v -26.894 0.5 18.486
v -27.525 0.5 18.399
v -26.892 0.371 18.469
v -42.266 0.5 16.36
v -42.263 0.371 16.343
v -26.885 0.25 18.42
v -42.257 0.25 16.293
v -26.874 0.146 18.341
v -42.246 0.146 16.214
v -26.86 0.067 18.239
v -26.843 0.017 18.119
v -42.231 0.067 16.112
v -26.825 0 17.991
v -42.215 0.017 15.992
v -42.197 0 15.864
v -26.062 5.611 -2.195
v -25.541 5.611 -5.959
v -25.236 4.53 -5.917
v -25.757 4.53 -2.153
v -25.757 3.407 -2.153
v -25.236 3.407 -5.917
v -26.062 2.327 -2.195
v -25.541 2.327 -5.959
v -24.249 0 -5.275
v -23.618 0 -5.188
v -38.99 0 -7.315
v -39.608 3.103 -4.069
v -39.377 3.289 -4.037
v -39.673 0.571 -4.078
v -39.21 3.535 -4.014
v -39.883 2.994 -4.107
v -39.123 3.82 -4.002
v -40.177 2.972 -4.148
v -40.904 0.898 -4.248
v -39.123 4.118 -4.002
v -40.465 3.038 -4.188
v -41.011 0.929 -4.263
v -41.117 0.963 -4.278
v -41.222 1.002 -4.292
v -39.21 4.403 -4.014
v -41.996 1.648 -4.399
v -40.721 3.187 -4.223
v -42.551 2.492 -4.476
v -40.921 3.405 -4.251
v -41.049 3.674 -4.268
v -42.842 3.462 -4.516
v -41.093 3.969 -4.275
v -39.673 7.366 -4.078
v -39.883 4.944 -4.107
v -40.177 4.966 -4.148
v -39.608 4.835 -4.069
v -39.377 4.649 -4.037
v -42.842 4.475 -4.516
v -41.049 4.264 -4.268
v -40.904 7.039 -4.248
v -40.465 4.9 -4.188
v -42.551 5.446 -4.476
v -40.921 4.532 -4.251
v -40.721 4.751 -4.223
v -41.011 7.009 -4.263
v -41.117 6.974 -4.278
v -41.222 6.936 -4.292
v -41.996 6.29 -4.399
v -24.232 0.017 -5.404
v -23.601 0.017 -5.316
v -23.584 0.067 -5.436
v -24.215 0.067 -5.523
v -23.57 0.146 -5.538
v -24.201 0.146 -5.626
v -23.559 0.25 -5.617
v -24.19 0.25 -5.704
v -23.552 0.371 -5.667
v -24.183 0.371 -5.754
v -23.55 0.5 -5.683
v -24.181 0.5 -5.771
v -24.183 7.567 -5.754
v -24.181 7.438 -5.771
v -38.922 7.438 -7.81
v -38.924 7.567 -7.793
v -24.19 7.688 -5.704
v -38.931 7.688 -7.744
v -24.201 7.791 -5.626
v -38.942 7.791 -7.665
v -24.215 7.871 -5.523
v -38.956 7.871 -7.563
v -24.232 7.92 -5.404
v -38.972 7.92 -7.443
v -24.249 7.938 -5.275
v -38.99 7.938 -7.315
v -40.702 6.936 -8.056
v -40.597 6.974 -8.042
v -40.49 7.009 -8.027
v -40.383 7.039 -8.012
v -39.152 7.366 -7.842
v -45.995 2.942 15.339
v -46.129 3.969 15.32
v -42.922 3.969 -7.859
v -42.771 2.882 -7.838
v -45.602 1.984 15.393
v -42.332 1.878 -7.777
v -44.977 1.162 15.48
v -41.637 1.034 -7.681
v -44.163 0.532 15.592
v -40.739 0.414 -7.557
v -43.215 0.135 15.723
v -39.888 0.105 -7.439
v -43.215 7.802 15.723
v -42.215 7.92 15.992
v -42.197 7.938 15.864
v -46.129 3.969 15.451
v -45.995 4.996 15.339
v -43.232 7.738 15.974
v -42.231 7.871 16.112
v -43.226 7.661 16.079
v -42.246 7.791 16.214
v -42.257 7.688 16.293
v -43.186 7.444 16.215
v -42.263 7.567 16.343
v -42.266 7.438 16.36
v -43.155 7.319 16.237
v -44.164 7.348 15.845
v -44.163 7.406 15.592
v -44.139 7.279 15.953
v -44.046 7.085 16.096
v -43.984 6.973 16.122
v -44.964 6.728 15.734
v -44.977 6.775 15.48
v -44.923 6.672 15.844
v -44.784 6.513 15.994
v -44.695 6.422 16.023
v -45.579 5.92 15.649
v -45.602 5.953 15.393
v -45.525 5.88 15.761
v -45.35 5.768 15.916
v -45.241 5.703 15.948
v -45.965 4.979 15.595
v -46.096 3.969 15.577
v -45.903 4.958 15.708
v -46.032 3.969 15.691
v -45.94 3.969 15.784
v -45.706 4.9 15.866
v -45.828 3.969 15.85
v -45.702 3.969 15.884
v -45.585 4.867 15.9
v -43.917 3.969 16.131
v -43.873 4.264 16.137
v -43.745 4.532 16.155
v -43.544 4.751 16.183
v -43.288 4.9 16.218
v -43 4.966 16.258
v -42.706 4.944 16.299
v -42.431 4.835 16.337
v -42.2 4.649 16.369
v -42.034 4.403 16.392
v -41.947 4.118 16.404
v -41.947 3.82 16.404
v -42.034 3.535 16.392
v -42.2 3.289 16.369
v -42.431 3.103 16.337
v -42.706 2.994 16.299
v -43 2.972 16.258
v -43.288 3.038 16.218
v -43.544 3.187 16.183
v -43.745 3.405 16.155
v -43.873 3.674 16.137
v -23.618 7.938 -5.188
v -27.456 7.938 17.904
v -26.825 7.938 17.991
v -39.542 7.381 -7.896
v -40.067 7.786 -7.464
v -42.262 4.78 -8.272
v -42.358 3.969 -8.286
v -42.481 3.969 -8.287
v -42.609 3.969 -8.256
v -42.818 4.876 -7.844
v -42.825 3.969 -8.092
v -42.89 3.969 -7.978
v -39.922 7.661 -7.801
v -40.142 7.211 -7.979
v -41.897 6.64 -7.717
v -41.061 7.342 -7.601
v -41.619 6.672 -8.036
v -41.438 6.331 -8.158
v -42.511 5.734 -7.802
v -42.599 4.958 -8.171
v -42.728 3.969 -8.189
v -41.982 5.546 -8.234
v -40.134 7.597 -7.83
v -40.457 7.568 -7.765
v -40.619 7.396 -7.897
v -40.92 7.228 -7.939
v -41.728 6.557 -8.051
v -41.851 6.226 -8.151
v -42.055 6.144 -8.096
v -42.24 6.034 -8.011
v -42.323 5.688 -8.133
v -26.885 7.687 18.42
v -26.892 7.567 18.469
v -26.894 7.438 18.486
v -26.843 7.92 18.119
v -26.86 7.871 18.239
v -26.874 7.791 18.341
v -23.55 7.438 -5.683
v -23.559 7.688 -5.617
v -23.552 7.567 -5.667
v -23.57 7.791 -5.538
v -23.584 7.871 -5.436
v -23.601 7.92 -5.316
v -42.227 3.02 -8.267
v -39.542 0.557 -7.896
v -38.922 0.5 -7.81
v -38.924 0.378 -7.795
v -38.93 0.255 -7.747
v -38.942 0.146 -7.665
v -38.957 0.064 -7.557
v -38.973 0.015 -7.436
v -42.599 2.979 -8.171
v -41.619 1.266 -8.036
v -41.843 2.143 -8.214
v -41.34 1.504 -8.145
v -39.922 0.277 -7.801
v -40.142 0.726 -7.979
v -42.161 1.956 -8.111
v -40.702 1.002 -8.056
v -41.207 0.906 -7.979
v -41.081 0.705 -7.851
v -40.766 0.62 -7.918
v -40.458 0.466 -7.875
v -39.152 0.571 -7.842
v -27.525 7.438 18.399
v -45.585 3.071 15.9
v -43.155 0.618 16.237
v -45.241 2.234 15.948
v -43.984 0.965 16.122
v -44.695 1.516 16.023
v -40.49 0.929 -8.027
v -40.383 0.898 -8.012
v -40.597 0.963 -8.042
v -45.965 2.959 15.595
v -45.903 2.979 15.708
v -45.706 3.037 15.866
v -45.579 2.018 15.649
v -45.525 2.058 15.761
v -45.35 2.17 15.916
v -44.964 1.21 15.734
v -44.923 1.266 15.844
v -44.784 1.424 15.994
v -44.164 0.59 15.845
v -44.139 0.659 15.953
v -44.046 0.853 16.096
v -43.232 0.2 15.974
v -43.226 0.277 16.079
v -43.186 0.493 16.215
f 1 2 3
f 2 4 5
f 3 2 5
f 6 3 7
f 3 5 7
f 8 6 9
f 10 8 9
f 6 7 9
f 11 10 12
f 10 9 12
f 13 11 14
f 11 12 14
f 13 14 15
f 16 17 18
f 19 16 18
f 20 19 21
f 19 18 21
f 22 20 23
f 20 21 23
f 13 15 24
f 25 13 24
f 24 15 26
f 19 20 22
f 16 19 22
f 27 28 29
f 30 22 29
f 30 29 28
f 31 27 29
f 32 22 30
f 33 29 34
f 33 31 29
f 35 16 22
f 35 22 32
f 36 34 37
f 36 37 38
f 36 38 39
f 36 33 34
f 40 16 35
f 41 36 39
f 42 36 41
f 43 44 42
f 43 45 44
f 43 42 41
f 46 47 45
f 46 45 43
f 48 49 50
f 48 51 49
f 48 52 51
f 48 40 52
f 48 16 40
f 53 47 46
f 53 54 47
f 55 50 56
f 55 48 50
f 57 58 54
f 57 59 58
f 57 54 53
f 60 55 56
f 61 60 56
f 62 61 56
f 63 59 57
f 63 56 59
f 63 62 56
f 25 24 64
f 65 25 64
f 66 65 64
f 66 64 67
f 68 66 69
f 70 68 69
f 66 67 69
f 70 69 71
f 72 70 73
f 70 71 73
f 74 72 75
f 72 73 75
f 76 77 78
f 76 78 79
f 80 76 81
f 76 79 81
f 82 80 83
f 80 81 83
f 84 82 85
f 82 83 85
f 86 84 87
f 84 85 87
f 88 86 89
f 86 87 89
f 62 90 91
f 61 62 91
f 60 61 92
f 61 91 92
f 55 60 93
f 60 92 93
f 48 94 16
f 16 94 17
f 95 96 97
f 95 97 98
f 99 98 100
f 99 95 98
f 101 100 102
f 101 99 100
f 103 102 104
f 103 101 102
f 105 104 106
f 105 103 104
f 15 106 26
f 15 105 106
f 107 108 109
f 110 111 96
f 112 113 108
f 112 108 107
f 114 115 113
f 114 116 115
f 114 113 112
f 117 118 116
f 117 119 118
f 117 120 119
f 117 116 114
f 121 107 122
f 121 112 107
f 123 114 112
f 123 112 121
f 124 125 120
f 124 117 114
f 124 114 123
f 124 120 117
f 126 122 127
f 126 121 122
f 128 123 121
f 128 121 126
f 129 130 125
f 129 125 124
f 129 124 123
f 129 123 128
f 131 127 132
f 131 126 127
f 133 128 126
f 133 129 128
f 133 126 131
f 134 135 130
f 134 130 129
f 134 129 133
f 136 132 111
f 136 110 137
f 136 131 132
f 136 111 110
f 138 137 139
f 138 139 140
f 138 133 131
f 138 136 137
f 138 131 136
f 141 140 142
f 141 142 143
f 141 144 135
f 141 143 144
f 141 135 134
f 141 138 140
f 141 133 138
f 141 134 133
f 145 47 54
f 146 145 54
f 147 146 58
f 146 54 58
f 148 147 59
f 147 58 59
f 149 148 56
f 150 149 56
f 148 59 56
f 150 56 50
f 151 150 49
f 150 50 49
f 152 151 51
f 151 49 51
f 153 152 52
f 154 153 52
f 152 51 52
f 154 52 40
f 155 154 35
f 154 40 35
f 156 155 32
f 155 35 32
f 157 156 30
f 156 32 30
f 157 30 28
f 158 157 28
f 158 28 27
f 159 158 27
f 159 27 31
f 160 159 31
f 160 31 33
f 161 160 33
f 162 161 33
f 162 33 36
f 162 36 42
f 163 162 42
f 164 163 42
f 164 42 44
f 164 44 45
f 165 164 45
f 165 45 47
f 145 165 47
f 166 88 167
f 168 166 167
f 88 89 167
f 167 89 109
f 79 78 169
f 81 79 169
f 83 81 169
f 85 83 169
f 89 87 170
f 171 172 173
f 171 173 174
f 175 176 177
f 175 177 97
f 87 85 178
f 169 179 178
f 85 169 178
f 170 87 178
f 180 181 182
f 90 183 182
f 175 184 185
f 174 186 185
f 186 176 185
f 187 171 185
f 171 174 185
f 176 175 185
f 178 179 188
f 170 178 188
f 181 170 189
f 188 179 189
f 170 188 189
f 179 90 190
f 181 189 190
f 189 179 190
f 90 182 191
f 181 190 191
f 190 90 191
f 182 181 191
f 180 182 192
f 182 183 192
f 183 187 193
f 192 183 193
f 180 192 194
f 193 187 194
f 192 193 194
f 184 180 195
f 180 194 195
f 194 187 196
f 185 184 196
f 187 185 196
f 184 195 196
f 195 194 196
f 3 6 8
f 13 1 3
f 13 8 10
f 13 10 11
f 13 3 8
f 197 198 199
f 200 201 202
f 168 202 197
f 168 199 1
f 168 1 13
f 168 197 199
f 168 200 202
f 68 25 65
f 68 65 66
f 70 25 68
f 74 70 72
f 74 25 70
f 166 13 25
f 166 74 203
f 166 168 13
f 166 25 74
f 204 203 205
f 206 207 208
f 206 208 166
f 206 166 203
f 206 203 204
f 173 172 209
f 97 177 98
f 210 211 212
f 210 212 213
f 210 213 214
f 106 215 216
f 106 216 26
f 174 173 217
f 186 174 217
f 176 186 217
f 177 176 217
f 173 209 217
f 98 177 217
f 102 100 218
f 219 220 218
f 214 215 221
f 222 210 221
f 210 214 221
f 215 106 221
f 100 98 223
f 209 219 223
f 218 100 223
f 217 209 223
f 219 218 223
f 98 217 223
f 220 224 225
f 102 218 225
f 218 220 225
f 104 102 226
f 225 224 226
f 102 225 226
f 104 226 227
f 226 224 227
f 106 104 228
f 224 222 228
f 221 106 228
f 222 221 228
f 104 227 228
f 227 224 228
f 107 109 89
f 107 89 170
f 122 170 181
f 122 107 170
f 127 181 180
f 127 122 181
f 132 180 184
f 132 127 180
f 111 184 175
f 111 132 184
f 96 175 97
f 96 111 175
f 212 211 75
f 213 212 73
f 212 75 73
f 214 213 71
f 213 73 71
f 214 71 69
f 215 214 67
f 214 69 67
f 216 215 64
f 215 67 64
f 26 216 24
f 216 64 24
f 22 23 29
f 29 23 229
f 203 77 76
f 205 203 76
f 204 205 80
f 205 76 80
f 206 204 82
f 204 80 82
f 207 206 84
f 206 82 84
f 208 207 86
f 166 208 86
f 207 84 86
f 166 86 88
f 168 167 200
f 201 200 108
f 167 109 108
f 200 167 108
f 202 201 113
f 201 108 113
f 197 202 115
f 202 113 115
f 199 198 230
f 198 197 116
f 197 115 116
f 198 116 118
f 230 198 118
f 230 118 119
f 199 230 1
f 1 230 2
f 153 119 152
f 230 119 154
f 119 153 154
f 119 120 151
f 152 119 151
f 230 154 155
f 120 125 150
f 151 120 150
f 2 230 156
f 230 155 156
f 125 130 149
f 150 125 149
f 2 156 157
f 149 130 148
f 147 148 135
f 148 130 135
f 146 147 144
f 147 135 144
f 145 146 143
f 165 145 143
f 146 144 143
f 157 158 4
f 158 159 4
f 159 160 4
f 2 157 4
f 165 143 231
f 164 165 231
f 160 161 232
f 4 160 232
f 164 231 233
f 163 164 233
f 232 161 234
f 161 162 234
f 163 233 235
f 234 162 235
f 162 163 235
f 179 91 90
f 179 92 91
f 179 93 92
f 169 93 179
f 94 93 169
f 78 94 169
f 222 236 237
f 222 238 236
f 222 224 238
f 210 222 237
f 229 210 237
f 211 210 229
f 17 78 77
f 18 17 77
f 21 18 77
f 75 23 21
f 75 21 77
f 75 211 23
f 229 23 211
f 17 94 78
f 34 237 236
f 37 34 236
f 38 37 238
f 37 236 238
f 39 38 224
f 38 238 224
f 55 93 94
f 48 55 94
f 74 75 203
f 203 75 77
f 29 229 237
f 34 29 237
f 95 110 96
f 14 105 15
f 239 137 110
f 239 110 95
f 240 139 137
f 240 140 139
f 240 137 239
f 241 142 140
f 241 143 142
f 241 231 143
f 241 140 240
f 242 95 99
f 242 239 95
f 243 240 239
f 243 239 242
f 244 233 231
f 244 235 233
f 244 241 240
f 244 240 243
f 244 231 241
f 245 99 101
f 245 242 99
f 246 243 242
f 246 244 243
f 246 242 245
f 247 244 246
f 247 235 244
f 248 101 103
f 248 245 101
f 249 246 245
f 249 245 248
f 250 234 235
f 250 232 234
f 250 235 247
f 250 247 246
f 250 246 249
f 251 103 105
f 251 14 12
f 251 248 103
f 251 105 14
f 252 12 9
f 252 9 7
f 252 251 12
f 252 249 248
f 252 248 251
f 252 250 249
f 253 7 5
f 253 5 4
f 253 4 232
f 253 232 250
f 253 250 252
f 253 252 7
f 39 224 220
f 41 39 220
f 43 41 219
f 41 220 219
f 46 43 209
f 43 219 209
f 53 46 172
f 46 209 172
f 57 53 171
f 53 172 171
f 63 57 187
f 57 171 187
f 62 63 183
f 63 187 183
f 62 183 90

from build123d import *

# Parameters (mm, degrees)
BOSS_EXTRUDE1_DEPTH     = 7.9375
SKETCH3_R               = 2.032
CUT_EXTRUDE1_DEPTH      = 2.7
SKETCH4_R               = 1.000000032
CUT_EXTRUDE2_DEPTH      = 51.553064313
CUT_EXTRUDE3_DEPTH      = 52.939206859
CUT_EXTRUDE3_DEPTH_BACK = 52.939206859
CUT_EXTRUDE5_DEPTH      = 0.7
FILLET1_R               = 0.5
SKETCH6_R               = 2.032
CUT_EXTRUDE4_DEPTH      = 3.8
BOSS_EXTRUDE2_DEPTH     = 0.637


with BuildPart() as part:
    # Sketch1 → Boss-Extrude1 (new body)
    with BuildSketch(Plane(origin=(0, 0, 0), x_dir=(1, 0, 0), z_dir=(0, 1, 0))):
        Polygon((-27.620855991, -19.092445695), (-46.29298428, -16.509012872), (-42.852975587, 8.354139385), (-24.180847298, 5.770706562), align=None)
    extrude(amount=BOSS_EXTRUDE1_DEPTH)

    # Sketch3 → Cut-Extrude1 (cut)
    with BuildSketch(Plane(origin=(0.275554746, 0, -2.386974896), x_dir=(-0.9905638349724136, 0, -0.13705213914691383), z_dir=(0.13705213914691383, 0, -0.9905638349724136))):
        with Locations((40.237375061, 3.96875)):
            Circle(SKETCH3_R)
    extrude(amount=-CUT_EXTRUDE1_DEPTH, mode=Mode.SUBTRACT)

    # Sketch4 → Cut-Extrude2 (cut, through all)
    with BuildSketch(Plane(origin=(-0.040811883, 0, 0.29497369), x_dir=(-0.9905638349724136, 0, -0.13705213914691383), z_dir=(0.1370521391469138, 0, -0.9905638349724135))):
        with Locations((40.291560511, 3.96875)):
            Circle(SKETCH4_R)
    extrude(amount=-CUT_EXTRUDE2_DEPTH, mode=Mode.SUBTRACT)

    # Sketch5 → Cut-Extrude3 (cut, two sides: drawn at the far end of the back side and taken through both)
    with BuildSketch(Plane(origin=(0.329228893, 0, -2.379548664), x_dir=(-0.9905638349724137, 0, -0.1370521391469133), z_dir=(0.1370521391469133, 0, -0.9905638349724137)).offset(-CUT_EXTRUDE3_DEPTH_BACK)):
        with BuildLine():
            ThreePointArc((43.593560511, 3.96875), (42.431140549, 1.162419962), (39.624810511, 0))
            Line((39.624810511, 0), (43.593560511, 0))
            Line((43.593560511, 0), (43.593560511, 3.96875))
        make_face()
        with BuildLine():
            Line((43.593560511, 7.9375), (39.624810511, 7.9375))
            ThreePointArc((39.624810511, 7.9375), (42.431140549, 6.775080038), (43.593560511, 3.96875))
            Line((43.593560511, 3.96875), (43.593560511, 7.9375))
        make_face()
    extrude(amount=CUT_EXTRUDE3_DEPTH + CUT_EXTRUDE3_DEPTH_BACK, mode=Mode.SUBTRACT)

    # Sketch8 → Cut-Extrude5 (cut)
    with BuildSketch(Plane(origin=(-3.1107798, 0, 22.483603594), x_dir=(0.9905638349724136, 0, 0.1370521391469135), z_dir=(-0.1370521391469135, 0, 0.9905638349724137))):
        with BuildLine():
            Line((-39.624810511, 0), (-24.743560511, 0))
            Line((-24.743560511, 0), (-24.743560511, 7.9375))
            Line((-24.743560511, 7.9375), (-39.624810511, 7.9375))
            ThreePointArc((-39.624810511, 7.9375), (-43.593560511, 3.96875), (-39.624810511, 0))
        make_face()
    extrude(amount=-CUT_EXTRUDE5_DEPTH, mode=Mode.SUBTRACT)

    # Fillet1
    fillet1_edges = [part.edges().sort_by_distance(p)[0] for p in [
        (-42.852975587, 3.96875, -8.354139385),
        (-31.551261333, 0, -6.790460135),
        (-46.197047782, 3.96875, 15.815618188),
        (-34.895333528, 7.9375, 17.379297438),
        (-34.895333528, 0, 17.379297438),
        (-31.551261333, 7.9375, -6.790460135),
    ]]
    fillet(fillet1_edges, radius=FILLET1_R)

    # Sketch6 → Cut-Extrude4 (cut)
    # profile 1 of 4: a face of its own
    with BuildSketch(Plane(origin=(0.329228893, 0, -2.379548664), x_dir=(-0.9905638349724137, 0, -0.1370521391469133), z_dir=(0.1370521391469133, 0, -0.9905638349724137))):
        with BuildLine():
            Line((41.099755957, 7.039164487), (39.857545305, 7.366139557))
            Line((39.857545305, 7.366139557), (26.117003817, 5.610790678))
            ThreePointArc((26.117003817, 5.610790678), (25.770140702, 3.96875), (26.117003817, 2.326709322))
            Line((26.117003817, 2.326709322), (39.857545305, 0.571360443))
            Line((39.857545305, 0.571360443), (41.099755957, 0.898335513))
            ThreePointArc((41.099755957, 0.898335513), (40.498298253, 0.800487936), (39.889225247, 0.819345082))
            Line((39.889225247, 0.819345082), (26.291560511, 2.556441511))
            Line((26.291560511, 2.556441511), (26.291560511, 3.67018175))
            ThreePointArc((26.291560511, 3.67018175), (27.210560511, 3.96875), (26.291560511, 4.26731825))
            Line((26.291560511, 4.26731825), (26.291560511, 5.381058489))
            Line((26.291560511, 5.381058489), (39.889225247, 7.118154918))
            ThreePointArc((39.889225247, 7.118154918), (40.498298253, 7.137012064), (41.099755957, 7.039164487))
        make_face()
    # profile 2 of 4: a face of its own
    with BuildSketch(Plane(origin=(0.329228893, 0, -2.379548664), x_dir=(-0.9905638349724137, 0, -0.1370521391469133), z_dir=(0.1370521391469133, 0, -0.9905638349724137))):
        with BuildLine():
            ThreePointArc((39.889225247, 0.819345082), (37.116560511, 3.96875), (39.889225247, 7.118154918))
            Line((39.889225247, 7.118154918), (26.291560511, 5.381058489))
            Line((26.291560511, 5.381058489), (26.291560511, 4.26731825))
            ThreePointArc((26.291560511, 4.26731825), (27.210560511, 3.96875), (26.291560511, 3.67018175))
            Line((26.291560511, 3.67018175), (26.291560511, 2.556441511))
            Line((26.291560511, 2.556441511), (39.889225247, 0.819345082))
        make_face()
    # profile 3 of 4: a face of its own
    with BuildSketch(Plane(origin=(0.329228893, 0, -2.379548664), x_dir=(-0.9905638349724137, 0, -0.1370521391469133), z_dir=(0.1370521391469133, 0, -0.9905638349724137))):
        with BuildLine():
            ThreePointArc((41.421703743, 6.935802624), (41.262106814, 6.991772473), (41.099755957, 7.039164487))
            ThreePointArc((41.099755957, 7.039164487), (40.498298253, 7.137012064), (39.889225247, 7.118154918))
            ThreePointArc((39.889225247, 7.118154918), (37.116560511, 3.96875), (39.889225247, 0.819345082))
            ThreePointArc((39.889225247, 0.819345082), (40.498298253, 0.800487936), (41.099755957, 0.898335513))
            ThreePointArc((41.099755957, 0.898335513), (41.262106814, 0.945727527), (41.421703743, 1.001697376))
            ThreePointArc((41.421703743, 1.001697376), (43.093560511, 3.96875), (41.421703743, 6.935802624))
        make_face()
        with Locations((40.291560511, 3.96875)):
            Circle(SKETCH6_R, mode=Mode.SUBTRACT)
    # profile 4 of 4: a face of its own
    with BuildSketch(Plane(origin=(0.329228893, 0, -2.379548664), x_dir=(-0.9905638349724137, 0, -0.1370521391469133), z_dir=(0.1370521391469133, 0, -0.9905638349724137))):
        with Locations((40.291560511, 3.96875)):
            Circle(SKETCH6_R)
    extrude(amount=-CUT_EXTRUDE4_DEPTH, mode=Mode.SUBTRACT)

    # Sketch7 → Boss-Extrude2 (add)
    with BuildSketch(Plane(origin=(-24.510076191, 0, -3.391157898), x_dir=(0.13705213914691317, 0, -0.9905638349724137), z_dir=(0.9905638349724137, 0, 0.13705213914691317))):
        with BuildLine():
            Line((-21.497783626, 0), (1.902216374, 0))
            ThreePointArc((1.902216374, 0), (2.255769765, 0.146446609), (2.402216374, 0.5))
            Line((2.402216374, 0.5), (2.402216374, 7.4375))
            ThreePointArc((2.402216374, 7.4375), (2.255769765, 7.791053391), (1.902216374, 7.9375))
            Line((1.902216374, 7.9375), (-21.497783626, 7.9375))
            ThreePointArc((-21.497783626, 7.9375), (-21.851337016, 7.791053391), (-21.997783626, 7.4375))
            Line((-21.997783626, 7.4375), (-21.997783626, 0.5))
            ThreePointArc((-21.997783626, 0.5), (-21.851337016, 0.146446609), (-21.497783626, 0))
        make_face()
    extrude(amount=BOSS_EXTRUDE2_DEPTH)


solid = part.part
